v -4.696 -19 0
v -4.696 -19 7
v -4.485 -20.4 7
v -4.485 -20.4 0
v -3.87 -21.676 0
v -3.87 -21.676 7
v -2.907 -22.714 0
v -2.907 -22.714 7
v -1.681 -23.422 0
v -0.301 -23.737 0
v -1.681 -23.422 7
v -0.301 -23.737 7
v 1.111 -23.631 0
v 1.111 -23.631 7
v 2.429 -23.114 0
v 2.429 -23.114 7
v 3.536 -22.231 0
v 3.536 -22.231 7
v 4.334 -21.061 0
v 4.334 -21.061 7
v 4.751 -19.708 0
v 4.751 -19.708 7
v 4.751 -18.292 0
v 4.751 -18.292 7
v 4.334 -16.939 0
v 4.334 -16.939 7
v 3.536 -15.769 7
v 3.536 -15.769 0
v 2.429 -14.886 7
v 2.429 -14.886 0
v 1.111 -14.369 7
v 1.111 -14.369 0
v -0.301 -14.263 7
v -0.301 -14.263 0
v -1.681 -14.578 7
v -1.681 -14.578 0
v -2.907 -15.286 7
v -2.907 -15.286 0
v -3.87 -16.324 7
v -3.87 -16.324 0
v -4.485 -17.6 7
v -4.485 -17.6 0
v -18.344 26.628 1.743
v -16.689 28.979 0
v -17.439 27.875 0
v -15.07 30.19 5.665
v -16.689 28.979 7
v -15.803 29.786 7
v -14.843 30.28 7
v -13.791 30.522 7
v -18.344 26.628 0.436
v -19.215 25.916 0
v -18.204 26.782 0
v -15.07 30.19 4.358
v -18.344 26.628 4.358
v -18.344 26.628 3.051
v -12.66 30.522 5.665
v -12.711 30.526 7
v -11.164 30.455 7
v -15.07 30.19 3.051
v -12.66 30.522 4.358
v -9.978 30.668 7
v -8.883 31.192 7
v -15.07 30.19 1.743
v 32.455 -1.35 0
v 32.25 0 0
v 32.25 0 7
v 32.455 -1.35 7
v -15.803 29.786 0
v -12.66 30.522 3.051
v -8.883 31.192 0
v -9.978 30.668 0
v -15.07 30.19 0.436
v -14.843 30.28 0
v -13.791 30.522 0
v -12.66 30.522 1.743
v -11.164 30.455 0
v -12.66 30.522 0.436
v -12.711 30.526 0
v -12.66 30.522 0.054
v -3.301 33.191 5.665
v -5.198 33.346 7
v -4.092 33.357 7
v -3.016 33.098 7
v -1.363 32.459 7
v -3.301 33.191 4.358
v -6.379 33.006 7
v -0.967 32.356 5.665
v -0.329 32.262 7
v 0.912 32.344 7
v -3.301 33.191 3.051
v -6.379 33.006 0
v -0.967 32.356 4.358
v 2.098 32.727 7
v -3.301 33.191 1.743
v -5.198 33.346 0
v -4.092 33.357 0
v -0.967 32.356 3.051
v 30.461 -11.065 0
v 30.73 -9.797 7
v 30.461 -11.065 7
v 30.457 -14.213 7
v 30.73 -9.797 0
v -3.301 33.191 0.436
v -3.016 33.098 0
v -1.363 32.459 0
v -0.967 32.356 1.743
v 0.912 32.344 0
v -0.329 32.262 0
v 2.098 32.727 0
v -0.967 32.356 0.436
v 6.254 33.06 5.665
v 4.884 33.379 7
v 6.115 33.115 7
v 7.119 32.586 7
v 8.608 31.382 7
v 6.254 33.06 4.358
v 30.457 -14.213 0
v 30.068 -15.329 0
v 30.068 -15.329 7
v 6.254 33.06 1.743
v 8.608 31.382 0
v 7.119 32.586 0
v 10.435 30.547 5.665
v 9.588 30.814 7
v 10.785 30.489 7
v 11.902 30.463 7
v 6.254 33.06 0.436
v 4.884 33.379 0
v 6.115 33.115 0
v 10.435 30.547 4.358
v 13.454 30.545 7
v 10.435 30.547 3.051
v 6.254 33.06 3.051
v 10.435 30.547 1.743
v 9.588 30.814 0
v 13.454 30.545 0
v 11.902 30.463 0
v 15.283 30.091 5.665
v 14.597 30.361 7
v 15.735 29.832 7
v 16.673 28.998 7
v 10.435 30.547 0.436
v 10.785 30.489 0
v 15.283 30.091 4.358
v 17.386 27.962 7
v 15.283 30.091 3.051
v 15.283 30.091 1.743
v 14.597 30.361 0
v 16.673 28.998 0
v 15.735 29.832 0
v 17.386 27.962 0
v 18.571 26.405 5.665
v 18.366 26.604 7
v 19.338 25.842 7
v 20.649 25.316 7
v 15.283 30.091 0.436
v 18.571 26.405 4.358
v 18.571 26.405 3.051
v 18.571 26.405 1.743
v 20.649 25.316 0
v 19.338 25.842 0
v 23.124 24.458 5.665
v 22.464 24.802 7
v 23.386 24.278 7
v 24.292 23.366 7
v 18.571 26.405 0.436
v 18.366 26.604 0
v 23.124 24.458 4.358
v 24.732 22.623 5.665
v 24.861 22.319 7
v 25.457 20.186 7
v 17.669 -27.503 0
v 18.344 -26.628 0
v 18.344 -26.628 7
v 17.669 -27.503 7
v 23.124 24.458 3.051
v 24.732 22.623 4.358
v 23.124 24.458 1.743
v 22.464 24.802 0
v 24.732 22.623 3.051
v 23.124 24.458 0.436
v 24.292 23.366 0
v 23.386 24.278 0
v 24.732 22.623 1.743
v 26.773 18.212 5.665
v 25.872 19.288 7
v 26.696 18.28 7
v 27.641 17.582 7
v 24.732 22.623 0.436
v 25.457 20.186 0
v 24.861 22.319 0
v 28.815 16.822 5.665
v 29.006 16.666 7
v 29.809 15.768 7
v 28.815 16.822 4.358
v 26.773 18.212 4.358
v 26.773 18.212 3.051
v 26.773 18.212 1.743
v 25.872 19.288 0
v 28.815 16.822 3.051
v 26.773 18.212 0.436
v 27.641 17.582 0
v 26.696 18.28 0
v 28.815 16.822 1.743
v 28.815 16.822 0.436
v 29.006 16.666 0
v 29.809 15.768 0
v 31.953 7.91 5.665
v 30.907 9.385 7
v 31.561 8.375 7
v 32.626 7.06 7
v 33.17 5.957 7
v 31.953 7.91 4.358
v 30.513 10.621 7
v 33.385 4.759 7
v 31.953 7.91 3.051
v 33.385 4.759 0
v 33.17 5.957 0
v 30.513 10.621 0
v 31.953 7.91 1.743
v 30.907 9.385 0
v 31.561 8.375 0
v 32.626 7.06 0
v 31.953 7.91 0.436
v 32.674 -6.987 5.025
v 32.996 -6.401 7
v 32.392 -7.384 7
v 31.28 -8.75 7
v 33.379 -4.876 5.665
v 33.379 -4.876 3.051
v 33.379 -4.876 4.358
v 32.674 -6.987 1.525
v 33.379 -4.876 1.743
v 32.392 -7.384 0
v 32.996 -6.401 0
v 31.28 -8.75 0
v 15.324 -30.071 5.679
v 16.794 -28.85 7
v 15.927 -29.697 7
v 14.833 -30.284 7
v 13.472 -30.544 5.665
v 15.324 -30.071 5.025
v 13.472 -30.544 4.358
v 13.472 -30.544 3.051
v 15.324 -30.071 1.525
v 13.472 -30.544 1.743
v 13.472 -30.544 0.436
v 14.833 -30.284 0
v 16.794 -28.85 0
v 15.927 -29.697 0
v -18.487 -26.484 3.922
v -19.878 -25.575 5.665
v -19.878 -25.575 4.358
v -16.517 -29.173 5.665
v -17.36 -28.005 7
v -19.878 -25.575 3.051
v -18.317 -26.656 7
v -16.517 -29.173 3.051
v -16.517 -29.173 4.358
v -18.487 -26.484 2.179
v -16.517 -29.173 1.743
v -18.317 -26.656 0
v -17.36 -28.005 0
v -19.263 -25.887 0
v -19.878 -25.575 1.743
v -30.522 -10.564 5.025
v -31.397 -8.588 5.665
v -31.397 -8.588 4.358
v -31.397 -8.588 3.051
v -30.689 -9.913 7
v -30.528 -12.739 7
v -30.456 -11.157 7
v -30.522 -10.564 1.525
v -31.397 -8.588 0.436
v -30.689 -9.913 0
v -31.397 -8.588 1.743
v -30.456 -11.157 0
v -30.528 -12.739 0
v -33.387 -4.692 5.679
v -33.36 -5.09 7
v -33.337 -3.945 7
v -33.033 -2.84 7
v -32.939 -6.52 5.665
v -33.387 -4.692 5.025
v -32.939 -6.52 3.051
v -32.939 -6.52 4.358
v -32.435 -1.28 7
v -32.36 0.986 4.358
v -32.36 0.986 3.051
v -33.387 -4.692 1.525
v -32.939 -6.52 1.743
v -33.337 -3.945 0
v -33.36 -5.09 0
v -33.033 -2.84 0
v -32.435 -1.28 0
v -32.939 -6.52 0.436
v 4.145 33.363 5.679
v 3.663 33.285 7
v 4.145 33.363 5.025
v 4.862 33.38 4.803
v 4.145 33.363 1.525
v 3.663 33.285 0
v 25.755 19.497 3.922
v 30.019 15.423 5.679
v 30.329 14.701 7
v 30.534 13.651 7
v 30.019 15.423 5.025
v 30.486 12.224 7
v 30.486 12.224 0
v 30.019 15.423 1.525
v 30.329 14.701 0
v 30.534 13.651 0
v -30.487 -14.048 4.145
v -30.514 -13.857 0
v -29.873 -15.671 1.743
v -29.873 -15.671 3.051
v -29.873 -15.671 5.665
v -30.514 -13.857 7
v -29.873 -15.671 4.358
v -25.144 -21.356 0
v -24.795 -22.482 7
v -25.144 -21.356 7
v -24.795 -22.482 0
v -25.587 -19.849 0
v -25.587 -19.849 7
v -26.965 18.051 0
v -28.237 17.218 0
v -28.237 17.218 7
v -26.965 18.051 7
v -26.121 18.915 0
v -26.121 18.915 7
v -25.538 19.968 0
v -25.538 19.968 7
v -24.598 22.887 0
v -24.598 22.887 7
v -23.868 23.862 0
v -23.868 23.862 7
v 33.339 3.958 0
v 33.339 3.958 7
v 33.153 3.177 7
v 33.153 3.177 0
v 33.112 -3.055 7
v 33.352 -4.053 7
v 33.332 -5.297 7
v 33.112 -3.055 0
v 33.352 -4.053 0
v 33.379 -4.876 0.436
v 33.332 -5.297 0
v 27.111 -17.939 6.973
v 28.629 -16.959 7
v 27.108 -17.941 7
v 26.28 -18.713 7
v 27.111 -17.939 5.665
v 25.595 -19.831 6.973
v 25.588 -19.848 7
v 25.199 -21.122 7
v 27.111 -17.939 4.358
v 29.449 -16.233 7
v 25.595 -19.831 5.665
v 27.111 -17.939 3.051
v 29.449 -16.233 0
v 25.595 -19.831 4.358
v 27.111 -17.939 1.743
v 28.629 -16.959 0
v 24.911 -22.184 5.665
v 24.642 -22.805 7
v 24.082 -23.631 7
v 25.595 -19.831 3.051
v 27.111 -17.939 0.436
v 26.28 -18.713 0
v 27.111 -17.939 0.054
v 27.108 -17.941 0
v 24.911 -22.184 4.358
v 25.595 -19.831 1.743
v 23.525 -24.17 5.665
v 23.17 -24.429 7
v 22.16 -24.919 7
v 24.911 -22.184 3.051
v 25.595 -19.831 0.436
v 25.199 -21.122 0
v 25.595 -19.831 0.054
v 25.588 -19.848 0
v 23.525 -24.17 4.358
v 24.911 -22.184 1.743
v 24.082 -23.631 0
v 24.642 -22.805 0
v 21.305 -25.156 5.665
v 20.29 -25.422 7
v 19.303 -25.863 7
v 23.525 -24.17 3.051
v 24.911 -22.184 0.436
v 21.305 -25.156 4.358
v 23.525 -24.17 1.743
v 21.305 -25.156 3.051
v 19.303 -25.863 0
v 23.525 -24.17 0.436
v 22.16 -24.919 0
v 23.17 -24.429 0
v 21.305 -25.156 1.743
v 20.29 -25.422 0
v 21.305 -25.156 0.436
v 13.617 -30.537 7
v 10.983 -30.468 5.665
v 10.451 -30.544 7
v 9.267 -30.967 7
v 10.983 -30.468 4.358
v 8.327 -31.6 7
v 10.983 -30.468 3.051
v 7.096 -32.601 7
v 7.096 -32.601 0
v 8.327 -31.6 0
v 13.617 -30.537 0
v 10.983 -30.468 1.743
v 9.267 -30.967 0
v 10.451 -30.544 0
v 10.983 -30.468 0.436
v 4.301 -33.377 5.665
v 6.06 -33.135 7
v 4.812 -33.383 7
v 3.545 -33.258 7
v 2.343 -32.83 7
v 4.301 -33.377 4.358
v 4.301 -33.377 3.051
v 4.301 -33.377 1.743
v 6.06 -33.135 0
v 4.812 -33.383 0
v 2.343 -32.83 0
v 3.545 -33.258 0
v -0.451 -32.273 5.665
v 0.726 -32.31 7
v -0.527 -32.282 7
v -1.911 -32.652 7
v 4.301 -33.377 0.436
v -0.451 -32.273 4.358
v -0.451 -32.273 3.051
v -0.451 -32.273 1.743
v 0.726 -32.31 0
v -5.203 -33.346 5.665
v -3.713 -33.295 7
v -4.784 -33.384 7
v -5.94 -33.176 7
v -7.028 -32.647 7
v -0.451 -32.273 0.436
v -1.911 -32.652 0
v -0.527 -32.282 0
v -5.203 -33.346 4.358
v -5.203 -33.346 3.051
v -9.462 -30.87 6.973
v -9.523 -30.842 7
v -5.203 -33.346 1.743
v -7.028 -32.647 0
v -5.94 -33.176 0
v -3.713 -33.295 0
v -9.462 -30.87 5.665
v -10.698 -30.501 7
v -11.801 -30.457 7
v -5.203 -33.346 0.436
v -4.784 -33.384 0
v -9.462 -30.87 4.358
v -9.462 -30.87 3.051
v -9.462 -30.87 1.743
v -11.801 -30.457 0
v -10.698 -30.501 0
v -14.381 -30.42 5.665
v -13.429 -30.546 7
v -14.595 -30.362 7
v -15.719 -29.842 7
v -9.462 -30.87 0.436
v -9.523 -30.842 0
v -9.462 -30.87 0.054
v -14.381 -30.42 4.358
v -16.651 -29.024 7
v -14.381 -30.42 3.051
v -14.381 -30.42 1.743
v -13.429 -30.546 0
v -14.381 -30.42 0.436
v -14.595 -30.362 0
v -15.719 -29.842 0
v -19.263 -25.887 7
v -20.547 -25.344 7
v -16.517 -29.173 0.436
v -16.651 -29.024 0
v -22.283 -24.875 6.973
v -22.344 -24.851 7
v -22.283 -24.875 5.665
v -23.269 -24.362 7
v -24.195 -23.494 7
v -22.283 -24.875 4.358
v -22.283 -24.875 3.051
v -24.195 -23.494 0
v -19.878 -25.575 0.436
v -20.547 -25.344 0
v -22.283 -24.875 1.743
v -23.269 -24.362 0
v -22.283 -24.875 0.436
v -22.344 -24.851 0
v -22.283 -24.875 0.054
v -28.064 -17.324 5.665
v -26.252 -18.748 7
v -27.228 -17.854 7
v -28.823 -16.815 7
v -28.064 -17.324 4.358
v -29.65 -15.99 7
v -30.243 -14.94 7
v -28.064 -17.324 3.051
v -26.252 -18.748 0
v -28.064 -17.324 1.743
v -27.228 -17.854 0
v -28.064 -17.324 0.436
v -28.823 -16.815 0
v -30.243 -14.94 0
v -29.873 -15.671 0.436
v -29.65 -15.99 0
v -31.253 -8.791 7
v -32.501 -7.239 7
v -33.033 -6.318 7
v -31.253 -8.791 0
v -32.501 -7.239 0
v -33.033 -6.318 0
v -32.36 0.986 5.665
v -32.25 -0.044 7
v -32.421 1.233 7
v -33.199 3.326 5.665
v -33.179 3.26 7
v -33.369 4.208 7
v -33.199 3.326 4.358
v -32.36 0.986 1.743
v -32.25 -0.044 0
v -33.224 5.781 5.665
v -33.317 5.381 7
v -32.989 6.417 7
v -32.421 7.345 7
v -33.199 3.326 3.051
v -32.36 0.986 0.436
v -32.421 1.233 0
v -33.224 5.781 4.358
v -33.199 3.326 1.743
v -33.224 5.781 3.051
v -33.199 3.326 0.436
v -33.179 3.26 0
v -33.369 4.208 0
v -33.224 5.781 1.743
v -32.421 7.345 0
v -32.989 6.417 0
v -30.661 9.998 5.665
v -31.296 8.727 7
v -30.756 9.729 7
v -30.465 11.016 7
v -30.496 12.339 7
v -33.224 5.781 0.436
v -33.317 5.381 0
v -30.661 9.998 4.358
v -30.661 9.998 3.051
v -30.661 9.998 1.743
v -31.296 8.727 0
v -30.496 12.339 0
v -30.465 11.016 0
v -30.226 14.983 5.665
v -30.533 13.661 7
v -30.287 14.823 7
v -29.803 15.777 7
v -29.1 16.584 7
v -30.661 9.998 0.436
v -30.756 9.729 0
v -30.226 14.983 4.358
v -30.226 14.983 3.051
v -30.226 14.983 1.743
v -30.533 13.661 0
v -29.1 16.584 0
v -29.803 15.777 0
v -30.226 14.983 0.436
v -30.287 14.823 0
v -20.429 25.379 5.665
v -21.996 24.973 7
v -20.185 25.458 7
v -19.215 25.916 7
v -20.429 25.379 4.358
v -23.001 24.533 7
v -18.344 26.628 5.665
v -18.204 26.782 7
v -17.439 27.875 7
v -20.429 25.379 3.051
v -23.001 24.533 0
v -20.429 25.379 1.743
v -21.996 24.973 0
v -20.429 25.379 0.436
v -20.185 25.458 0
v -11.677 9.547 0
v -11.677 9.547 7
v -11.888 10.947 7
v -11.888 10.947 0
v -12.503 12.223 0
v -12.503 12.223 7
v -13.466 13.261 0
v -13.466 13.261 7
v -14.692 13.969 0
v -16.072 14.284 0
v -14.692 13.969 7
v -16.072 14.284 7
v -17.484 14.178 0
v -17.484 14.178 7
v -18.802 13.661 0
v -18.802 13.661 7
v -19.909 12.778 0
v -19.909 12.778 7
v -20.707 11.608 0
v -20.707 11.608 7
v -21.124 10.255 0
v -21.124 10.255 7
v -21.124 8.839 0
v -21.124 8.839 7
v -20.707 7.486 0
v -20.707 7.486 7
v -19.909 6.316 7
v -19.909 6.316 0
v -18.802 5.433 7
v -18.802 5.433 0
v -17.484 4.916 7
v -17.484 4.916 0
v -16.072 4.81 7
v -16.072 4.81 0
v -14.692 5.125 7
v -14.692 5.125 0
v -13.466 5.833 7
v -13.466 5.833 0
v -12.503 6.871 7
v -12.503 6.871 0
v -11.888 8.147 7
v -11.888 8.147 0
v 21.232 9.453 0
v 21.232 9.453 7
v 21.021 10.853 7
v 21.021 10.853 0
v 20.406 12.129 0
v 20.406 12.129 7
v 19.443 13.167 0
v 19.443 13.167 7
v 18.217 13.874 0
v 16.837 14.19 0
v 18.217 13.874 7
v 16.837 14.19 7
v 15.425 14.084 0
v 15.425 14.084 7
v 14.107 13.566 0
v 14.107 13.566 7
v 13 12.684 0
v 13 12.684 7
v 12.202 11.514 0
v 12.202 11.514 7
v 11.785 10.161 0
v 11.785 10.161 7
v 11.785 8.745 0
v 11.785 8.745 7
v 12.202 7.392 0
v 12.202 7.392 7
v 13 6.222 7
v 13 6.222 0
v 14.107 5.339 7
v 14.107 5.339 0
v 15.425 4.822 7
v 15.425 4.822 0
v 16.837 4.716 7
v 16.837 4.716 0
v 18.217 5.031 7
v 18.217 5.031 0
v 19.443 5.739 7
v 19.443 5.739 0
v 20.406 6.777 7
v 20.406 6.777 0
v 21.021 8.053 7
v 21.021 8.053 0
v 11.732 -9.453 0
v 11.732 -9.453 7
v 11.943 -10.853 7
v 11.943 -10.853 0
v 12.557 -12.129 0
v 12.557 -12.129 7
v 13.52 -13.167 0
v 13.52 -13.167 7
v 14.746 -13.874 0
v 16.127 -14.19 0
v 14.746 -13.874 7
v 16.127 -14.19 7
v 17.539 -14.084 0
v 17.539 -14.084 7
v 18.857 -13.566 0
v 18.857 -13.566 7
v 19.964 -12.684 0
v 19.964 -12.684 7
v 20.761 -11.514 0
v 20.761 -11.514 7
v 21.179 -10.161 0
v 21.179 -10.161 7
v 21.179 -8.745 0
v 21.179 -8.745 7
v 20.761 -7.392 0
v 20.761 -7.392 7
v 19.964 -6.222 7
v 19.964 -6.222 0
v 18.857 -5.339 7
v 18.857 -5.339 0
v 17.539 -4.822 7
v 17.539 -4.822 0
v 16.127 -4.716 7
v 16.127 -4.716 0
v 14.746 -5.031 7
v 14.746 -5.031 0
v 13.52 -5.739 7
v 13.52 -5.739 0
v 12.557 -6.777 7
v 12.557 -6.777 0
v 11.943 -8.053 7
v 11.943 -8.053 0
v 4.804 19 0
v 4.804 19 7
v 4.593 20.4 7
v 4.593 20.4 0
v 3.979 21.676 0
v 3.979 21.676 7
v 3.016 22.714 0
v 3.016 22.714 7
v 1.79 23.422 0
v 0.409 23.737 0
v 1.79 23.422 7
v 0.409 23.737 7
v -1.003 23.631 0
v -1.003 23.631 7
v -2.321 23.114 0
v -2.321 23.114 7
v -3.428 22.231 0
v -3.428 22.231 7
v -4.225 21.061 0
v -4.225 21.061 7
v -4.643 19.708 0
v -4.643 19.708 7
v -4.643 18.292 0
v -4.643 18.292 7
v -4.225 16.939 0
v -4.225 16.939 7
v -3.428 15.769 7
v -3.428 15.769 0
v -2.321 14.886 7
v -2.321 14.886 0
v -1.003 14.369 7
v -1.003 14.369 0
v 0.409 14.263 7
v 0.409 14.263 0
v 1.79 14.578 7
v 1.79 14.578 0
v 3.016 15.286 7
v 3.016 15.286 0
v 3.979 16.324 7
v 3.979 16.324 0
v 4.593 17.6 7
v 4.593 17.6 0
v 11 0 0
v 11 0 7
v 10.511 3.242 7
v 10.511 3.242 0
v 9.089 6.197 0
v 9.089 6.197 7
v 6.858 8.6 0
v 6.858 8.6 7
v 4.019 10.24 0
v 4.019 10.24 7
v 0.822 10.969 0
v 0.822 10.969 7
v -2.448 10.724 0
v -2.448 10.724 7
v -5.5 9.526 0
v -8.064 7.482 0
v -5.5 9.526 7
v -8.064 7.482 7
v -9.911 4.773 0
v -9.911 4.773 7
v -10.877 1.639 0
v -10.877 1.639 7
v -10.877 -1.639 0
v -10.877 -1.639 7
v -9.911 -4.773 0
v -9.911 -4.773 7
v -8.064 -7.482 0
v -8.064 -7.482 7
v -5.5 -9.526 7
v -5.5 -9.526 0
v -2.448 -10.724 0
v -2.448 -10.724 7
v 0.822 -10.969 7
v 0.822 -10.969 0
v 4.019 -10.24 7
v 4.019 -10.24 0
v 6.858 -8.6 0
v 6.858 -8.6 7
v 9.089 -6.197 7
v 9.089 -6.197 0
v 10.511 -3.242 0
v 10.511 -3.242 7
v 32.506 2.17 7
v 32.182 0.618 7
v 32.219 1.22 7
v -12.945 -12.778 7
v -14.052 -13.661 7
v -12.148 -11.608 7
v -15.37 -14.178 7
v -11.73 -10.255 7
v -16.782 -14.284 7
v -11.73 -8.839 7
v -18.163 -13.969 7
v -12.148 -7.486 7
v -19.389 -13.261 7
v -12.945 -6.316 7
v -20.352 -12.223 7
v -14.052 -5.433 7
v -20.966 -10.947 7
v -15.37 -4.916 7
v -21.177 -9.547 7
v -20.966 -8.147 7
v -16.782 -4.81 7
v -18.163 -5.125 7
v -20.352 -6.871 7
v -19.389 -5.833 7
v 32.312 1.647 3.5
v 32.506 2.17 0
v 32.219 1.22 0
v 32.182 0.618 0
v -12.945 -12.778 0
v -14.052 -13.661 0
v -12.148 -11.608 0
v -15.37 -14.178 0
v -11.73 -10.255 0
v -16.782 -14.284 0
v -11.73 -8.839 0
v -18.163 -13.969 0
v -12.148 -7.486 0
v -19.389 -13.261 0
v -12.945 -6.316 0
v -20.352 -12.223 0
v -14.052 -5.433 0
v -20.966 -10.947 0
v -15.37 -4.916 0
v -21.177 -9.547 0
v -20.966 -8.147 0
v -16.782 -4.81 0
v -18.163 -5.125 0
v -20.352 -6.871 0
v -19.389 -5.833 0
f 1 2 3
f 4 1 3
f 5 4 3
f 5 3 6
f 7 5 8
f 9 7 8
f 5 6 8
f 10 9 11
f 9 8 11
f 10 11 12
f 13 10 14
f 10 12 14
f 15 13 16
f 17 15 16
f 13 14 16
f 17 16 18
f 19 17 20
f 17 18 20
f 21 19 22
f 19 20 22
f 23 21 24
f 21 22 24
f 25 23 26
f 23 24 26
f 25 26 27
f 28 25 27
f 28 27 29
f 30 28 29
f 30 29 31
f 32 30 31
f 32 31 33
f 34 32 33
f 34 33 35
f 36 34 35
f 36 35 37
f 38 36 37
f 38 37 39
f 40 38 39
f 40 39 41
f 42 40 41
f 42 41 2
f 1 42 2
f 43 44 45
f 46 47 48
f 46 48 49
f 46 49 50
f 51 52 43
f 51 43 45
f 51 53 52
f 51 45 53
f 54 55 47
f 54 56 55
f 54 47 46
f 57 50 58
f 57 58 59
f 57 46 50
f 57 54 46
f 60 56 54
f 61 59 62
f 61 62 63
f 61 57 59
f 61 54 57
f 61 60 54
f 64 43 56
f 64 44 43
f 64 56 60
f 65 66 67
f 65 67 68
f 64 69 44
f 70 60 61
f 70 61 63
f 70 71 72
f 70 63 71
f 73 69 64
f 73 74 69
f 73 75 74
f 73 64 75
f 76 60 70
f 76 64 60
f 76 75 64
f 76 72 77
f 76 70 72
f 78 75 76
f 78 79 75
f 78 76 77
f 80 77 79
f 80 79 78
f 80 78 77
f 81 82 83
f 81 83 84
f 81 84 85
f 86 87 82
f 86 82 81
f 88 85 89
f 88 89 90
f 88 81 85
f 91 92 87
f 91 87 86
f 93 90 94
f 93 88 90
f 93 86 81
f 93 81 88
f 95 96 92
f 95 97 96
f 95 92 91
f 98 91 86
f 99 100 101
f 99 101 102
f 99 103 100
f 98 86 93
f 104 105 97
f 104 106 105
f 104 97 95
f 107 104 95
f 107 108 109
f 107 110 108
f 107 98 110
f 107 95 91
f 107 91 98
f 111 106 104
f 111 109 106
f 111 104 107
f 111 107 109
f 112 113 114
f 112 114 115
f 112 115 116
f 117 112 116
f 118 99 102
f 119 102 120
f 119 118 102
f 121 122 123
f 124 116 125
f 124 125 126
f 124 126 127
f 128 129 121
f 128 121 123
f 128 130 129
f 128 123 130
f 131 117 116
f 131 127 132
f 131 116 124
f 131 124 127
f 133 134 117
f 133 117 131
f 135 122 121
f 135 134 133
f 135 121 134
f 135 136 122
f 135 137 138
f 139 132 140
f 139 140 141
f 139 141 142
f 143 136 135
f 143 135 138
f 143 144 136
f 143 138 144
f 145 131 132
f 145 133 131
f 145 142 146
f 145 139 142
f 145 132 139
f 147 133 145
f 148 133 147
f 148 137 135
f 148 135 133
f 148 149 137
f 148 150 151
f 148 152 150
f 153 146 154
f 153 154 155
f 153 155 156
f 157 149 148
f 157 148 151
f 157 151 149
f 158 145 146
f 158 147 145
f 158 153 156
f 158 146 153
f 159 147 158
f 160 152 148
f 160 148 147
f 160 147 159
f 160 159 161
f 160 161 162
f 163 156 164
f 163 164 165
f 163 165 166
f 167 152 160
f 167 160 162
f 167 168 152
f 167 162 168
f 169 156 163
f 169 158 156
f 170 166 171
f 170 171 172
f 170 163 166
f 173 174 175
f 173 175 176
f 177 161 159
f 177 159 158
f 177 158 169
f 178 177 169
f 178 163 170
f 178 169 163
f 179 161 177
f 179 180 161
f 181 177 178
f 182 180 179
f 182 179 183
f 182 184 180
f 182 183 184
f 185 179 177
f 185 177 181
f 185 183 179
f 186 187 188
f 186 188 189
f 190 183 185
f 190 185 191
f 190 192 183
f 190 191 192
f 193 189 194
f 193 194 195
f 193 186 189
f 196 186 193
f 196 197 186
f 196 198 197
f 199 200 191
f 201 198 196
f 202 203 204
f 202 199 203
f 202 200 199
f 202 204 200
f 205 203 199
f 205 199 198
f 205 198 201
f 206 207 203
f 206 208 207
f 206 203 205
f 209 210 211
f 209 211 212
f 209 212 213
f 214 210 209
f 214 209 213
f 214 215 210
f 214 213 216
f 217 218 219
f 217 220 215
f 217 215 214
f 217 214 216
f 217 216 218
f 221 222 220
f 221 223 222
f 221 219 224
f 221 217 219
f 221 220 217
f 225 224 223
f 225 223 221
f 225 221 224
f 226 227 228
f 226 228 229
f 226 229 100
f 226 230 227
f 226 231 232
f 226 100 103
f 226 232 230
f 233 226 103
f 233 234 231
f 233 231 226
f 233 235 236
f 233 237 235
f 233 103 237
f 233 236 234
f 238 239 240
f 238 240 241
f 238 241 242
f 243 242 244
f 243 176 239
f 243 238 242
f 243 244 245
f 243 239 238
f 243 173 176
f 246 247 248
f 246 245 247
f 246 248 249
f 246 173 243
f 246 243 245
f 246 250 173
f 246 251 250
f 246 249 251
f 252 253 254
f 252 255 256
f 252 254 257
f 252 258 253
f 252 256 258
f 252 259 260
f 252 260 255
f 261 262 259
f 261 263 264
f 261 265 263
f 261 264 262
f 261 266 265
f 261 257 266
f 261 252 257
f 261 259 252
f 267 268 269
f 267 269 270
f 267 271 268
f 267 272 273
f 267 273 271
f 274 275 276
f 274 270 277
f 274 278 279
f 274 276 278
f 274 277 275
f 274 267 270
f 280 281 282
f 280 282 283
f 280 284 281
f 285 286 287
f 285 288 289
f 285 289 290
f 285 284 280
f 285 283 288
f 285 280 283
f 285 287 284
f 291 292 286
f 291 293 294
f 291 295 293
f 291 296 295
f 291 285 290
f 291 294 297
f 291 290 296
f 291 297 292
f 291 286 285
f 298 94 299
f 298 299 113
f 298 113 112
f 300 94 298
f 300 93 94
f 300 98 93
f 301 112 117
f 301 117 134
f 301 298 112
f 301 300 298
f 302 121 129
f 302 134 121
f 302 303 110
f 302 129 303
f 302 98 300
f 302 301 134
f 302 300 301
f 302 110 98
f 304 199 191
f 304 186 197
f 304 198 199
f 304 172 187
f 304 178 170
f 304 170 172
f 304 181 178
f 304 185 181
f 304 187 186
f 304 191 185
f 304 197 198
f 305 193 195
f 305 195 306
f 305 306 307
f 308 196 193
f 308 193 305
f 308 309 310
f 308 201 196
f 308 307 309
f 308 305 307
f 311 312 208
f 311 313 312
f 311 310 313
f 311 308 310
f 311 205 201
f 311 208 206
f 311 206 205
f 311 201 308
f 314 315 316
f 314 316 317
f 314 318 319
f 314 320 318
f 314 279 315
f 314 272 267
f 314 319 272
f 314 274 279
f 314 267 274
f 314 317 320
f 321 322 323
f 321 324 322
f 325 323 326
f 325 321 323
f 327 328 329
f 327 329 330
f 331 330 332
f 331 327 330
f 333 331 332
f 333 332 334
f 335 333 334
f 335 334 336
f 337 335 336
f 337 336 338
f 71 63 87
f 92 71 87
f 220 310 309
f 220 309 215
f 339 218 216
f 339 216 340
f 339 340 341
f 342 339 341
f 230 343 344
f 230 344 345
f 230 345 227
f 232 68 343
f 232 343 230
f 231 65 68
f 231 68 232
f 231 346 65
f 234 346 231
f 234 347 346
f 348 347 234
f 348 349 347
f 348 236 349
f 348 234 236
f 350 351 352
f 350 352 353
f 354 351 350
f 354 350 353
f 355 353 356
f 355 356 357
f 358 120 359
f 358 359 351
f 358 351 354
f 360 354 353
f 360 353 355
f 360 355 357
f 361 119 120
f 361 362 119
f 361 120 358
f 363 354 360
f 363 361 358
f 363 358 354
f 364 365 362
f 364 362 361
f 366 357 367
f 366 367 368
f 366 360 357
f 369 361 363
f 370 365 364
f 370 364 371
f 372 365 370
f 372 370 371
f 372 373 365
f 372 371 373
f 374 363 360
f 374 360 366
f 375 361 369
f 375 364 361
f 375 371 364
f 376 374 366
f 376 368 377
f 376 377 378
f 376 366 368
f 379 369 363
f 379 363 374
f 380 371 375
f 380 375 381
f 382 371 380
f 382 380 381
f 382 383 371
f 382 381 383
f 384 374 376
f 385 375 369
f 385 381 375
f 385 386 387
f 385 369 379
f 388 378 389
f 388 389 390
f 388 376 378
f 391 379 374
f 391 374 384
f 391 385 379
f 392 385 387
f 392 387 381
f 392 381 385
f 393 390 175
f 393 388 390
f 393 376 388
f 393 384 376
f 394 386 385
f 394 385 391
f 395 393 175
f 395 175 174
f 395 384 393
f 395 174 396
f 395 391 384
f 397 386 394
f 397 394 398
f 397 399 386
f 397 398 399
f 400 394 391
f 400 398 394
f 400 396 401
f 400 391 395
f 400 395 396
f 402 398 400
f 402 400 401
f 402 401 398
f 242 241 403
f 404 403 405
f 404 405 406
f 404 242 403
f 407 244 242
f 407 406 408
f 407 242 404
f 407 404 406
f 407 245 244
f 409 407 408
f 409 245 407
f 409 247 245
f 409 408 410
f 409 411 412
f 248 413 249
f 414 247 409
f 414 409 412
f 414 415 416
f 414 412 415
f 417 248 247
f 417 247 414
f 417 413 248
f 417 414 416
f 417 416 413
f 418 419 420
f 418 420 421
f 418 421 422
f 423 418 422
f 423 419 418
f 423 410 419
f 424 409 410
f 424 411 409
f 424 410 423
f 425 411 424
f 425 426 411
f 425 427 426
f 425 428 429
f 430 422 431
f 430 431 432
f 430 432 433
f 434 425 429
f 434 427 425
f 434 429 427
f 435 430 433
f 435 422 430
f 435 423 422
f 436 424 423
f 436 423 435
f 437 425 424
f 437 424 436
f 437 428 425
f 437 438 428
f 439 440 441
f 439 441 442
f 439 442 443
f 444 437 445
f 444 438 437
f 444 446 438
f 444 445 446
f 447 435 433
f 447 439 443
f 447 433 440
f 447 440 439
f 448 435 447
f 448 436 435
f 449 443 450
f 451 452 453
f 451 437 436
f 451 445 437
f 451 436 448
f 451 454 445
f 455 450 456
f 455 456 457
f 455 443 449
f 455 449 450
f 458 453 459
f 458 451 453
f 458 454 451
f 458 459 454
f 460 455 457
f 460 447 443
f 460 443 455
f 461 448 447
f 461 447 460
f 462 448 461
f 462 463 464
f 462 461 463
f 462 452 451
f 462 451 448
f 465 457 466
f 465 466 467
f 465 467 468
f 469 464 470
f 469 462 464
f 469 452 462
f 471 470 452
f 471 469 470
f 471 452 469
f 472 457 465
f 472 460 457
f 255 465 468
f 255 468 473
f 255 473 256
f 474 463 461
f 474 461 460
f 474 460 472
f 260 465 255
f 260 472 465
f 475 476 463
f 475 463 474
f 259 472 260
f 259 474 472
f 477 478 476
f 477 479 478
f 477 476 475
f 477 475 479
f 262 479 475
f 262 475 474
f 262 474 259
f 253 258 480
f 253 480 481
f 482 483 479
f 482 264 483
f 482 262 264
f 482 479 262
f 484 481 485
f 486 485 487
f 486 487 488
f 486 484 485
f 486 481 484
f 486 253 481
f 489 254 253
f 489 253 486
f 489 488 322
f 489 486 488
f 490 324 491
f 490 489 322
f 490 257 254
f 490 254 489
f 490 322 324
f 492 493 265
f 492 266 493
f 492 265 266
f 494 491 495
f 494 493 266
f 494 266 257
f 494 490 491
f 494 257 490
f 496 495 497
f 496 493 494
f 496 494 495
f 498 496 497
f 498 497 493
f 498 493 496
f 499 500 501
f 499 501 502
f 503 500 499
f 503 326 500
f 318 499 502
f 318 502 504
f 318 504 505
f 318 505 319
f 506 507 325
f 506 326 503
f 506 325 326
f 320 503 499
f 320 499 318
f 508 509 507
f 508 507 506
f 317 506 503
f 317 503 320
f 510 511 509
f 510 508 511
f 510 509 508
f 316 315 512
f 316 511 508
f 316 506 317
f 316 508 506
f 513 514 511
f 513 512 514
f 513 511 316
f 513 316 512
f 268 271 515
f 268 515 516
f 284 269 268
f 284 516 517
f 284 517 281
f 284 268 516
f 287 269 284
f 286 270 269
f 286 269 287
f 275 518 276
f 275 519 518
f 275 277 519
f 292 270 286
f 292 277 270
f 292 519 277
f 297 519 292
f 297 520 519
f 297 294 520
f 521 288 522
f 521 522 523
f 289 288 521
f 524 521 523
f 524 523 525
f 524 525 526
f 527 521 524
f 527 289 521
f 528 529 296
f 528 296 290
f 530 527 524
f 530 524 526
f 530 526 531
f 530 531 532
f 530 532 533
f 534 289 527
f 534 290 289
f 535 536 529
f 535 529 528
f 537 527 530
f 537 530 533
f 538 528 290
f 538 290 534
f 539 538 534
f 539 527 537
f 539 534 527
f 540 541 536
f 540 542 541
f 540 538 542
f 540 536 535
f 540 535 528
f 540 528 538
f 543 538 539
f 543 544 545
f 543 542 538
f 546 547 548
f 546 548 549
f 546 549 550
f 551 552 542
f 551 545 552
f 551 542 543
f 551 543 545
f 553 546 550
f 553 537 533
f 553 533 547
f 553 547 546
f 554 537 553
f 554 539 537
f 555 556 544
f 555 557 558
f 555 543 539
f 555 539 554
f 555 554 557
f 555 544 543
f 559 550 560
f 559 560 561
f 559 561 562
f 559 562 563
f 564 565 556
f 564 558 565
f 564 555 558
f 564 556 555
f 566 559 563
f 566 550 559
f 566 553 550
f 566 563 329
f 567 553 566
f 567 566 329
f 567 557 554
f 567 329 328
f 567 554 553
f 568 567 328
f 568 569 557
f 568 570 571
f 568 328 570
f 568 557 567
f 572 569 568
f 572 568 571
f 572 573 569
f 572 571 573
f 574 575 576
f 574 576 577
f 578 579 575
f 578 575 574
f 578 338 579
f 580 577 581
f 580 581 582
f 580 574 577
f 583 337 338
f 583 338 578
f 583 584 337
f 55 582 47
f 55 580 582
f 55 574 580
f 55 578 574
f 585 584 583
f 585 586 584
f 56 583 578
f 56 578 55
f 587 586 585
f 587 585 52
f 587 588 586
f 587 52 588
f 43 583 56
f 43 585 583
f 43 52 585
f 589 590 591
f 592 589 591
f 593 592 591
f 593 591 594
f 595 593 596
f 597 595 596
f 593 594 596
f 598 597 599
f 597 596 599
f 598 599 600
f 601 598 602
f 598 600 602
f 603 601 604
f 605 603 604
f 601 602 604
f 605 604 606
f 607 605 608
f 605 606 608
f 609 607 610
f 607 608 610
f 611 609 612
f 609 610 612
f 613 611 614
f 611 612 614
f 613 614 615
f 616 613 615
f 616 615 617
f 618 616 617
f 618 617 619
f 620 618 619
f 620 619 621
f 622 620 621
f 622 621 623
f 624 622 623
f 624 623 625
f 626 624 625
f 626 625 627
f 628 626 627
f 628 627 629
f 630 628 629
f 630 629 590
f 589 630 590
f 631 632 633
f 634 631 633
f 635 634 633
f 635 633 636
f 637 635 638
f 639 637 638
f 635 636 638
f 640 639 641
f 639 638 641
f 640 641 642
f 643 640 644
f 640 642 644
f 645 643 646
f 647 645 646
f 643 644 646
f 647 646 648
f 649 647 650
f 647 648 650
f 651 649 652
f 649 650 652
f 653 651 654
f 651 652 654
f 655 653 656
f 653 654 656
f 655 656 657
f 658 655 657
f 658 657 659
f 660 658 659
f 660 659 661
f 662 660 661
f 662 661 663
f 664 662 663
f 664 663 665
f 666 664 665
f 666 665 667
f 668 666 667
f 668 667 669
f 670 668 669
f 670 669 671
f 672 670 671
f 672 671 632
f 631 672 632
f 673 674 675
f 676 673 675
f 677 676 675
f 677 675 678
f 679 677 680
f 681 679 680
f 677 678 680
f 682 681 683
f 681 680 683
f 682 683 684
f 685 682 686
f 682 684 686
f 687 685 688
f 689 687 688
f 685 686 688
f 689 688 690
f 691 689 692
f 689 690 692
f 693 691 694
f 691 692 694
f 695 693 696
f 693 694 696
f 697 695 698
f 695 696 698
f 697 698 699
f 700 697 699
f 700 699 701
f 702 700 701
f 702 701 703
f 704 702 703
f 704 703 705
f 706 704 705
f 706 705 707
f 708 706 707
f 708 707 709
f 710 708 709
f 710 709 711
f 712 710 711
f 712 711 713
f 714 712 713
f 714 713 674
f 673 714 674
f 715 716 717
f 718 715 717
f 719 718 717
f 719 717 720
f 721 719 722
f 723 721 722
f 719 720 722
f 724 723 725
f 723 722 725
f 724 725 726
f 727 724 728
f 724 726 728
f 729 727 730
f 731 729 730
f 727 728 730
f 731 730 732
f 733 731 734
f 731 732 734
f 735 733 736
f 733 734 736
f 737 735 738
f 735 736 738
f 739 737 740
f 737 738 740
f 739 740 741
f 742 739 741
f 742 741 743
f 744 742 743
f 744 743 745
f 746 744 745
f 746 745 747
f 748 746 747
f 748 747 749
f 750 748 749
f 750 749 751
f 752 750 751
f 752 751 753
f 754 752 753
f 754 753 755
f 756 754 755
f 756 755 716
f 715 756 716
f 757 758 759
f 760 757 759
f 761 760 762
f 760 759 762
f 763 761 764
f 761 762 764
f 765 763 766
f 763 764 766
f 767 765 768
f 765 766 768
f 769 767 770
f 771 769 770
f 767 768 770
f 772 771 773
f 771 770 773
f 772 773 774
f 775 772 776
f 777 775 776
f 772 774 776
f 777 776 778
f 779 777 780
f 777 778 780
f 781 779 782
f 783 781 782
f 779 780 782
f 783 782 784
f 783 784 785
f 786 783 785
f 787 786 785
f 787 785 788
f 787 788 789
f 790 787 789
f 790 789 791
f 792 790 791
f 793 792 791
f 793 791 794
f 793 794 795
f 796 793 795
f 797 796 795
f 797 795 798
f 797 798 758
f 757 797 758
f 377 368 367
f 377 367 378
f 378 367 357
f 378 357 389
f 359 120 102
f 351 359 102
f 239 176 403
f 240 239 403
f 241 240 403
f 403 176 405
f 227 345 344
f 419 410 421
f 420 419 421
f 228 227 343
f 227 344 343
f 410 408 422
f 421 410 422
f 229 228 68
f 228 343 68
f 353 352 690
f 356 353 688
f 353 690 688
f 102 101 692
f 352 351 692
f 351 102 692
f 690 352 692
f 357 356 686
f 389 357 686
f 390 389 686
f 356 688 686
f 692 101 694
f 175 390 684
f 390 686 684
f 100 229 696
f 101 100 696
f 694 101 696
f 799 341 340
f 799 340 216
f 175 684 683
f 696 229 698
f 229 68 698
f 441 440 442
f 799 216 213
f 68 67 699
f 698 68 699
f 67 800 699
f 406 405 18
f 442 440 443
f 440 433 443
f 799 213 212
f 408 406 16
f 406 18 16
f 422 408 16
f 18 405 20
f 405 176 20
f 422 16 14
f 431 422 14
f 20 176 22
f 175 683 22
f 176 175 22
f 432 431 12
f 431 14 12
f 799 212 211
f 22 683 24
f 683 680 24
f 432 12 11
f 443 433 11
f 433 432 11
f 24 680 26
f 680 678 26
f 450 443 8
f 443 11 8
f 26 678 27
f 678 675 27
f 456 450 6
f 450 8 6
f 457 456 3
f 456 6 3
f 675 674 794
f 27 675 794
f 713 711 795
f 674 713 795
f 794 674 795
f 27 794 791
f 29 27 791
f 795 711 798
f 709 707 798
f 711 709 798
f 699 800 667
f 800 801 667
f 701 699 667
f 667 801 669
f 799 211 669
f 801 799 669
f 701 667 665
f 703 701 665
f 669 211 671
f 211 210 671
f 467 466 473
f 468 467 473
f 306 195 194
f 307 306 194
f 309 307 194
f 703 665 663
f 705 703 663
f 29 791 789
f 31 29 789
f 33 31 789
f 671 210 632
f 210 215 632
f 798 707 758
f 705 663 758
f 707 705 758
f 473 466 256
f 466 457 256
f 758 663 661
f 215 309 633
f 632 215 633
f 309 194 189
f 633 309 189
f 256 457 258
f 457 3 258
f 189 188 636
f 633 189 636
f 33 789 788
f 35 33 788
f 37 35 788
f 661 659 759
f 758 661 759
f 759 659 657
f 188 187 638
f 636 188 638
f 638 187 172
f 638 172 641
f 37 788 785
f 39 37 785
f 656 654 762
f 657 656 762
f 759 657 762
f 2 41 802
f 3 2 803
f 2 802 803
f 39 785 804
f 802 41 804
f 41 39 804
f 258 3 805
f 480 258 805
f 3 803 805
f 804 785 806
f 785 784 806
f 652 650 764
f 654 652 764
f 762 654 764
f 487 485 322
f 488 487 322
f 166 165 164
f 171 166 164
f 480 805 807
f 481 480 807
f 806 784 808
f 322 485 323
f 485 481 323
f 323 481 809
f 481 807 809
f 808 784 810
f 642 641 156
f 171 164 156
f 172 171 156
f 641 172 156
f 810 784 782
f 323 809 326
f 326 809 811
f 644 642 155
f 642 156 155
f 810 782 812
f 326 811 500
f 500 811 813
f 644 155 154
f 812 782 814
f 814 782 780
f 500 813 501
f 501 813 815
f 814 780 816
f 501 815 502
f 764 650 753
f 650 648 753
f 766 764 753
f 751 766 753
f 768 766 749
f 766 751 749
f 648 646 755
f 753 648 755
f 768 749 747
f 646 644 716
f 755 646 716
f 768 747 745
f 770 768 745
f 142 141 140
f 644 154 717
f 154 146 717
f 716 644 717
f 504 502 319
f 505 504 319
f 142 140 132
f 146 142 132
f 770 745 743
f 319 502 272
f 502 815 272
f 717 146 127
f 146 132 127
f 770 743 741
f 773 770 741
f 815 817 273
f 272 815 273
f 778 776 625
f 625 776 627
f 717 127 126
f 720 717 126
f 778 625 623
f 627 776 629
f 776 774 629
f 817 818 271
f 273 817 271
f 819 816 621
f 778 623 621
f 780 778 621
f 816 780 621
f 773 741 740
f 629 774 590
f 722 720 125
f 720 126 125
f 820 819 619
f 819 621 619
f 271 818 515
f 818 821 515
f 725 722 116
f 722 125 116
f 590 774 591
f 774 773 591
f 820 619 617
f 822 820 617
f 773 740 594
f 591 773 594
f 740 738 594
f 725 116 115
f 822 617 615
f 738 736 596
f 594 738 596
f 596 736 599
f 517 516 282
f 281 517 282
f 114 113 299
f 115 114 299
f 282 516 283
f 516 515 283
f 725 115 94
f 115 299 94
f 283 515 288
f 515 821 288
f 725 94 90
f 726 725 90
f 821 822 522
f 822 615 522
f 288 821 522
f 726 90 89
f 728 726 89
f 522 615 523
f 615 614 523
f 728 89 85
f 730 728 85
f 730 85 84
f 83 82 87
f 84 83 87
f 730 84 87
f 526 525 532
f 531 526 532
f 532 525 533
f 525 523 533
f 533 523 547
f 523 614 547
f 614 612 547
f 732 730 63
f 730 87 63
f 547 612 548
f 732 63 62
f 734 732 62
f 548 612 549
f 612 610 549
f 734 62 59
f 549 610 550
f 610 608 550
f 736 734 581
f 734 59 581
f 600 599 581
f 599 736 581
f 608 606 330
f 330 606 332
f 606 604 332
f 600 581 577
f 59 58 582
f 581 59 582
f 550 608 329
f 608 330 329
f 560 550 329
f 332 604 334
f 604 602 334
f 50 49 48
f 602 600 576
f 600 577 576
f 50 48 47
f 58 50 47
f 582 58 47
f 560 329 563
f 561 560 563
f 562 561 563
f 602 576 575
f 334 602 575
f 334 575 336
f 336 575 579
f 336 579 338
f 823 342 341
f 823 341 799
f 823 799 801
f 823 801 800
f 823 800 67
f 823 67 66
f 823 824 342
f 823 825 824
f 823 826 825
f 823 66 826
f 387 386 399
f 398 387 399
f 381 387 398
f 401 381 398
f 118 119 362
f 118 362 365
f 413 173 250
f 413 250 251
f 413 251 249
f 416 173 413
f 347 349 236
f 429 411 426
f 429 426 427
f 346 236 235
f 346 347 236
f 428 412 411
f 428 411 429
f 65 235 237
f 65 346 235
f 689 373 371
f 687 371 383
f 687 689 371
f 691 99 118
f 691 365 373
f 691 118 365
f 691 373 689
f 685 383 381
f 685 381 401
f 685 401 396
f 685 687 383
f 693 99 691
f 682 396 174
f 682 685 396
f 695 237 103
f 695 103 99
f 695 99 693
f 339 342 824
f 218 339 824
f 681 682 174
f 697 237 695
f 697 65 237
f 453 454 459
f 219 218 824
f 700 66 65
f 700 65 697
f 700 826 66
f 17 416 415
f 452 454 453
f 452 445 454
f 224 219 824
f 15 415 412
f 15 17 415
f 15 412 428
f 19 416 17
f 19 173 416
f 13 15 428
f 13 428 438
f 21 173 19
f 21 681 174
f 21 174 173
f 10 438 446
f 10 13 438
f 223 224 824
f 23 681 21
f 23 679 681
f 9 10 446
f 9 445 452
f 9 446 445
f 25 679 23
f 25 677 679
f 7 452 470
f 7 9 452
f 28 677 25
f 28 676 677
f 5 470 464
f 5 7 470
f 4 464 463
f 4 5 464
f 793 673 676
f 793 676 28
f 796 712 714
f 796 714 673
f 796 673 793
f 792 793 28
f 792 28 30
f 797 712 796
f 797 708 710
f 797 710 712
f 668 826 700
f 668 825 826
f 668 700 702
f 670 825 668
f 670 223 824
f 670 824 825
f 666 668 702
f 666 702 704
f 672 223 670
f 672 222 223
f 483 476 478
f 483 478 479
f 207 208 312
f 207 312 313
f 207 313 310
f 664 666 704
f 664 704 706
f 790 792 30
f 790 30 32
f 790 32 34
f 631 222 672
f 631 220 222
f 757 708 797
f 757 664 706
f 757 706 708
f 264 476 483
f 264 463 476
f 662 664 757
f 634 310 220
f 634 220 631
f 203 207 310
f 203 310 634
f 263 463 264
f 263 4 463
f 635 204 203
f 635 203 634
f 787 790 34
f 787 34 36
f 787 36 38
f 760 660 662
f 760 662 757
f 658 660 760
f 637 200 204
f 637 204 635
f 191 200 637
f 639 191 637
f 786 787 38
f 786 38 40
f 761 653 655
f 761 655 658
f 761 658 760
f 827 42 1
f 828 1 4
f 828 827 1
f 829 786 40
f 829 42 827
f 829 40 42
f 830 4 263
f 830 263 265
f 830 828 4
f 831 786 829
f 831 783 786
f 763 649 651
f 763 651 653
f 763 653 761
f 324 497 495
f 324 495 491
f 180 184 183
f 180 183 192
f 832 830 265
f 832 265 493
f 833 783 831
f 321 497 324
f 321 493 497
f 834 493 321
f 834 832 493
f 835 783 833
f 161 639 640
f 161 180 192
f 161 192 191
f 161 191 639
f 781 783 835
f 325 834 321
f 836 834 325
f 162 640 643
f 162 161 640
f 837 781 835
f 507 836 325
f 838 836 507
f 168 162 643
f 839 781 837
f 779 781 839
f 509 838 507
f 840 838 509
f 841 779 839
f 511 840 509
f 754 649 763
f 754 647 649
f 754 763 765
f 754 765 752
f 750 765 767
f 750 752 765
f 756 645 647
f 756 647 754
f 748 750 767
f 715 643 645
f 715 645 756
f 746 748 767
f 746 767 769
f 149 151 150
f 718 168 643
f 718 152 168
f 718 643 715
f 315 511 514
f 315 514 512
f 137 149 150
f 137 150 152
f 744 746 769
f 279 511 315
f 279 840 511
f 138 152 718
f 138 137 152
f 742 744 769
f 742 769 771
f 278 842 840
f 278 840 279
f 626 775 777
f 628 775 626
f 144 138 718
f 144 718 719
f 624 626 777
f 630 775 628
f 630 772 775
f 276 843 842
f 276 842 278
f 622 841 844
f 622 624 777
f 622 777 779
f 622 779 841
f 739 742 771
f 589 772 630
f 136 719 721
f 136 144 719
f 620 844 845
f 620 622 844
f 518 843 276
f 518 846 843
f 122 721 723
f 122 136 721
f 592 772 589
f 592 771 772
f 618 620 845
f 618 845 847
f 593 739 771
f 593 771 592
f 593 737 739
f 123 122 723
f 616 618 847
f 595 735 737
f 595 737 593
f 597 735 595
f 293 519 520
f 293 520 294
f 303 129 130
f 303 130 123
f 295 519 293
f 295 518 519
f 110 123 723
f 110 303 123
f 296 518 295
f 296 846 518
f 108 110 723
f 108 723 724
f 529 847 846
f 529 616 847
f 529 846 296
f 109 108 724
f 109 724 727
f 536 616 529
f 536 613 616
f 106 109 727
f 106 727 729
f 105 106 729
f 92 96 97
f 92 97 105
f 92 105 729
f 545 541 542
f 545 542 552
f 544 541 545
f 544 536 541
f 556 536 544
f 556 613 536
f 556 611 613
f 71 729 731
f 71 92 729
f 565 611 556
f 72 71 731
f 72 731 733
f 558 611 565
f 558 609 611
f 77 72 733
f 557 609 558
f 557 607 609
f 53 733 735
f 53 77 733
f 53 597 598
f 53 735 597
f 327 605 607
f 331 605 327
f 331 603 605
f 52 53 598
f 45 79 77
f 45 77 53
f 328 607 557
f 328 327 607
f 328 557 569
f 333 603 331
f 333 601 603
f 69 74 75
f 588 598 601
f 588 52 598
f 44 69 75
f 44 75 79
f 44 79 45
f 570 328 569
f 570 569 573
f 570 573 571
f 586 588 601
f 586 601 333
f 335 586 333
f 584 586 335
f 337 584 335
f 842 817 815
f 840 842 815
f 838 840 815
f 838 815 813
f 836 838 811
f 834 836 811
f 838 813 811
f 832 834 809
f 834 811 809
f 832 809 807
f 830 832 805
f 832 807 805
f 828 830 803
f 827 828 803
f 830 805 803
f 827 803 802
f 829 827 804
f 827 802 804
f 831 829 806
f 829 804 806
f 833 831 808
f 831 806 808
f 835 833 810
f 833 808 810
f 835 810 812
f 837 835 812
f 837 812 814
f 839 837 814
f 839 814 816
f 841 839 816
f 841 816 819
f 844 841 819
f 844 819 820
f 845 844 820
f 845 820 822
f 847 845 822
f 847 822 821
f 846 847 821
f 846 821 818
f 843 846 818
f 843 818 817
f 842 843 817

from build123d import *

# Parameters (mm, degrees)
BOSS_EXTRUDE1_DEPTH = 7
SKETCH2_R           = 11
SKETCH2_R_2         = 4.75
SKETCH2_R_3         = 4.749999995
SKETCH2_R_4         = 4.750000007
SKETCH2_R_5         = 4.750000003
CUT_EXTRUDE3_DEPTH  = 48.733141781


with BuildPart() as part:
    # Sketch1 → Boss-Extrude1 (new body)
    with BuildSketch(Plane.XY):
        with BuildLine():
            add(Edge.make_bspline(
                [(32.25, 1e-09), (32.25, -0.03584026), (32.251080395, -0.107557917), (32.255942168, -0.244822693), (32.268861596, -0.42423358), (32.288126492, -0.590307491), (32.313597344, -0.75526022), (32.345083769, -0.921284338), (32.382340363, -1.086200834), (32.435743217, -1.290221504), (32.510017409, -1.532192074), (32.609572454, -1.810337489), (32.736031435, -2.123211782), (32.868409264, -2.433561535), (32.998463612, -2.744978513), (33.147670028, -3.139574299), (33.29203351, -3.625611027), (33.391238098, -4.209938144), (33.40159236, -4.963887179), (33.263092101, -5.783976593), (32.933637021, -6.632976673), (32.380720256, -7.44914111), (31.743633074, -8.128548572), (31.194565339, -8.824864423), (30.792041933, -9.563839804), (30.542619062, -10.317563139), (30.426059081, -11.150959974), (30.453700427, -12.037430256), (30.571486472, -12.961397721), (30.548973562, -13.946062453), (30.305827306, -14.908972914), (29.8488621, -15.794930036), (29.197566297, -16.55957303), (28.387565065, -17.156146763), (27.550974388, -17.611279668), (26.8094699, -18.137433767), (26.205567855, -18.754025976), (25.754198906, -19.433148369), (25.419097837, -20.210957063), (25.205654831, -21.059332432), (25.023165763, -21.946222304), (24.678918541, -22.824303369), (24.155385031, -23.610913554), (23.47258695, -24.266165938), (22.663154471, -24.7596191), (21.767380441, -25.068988477), (20.873877723, -25.241670484), (20.026176208, -25.483558737), (19.257961529, -25.852796939), (18.597014435, -26.339289543), (18.015319336, -26.96235034), (17.530200194, -27.697909274), (17.088002691, -28.493747234), (16.507844893, -29.243486782), (15.772859754, -29.859313296), (14.912564693, -30.302576631), (13.965315475, -30.54635699), (12.98025215, -30.573037387), (12.056322353, -30.455886167), (11.169960105, -30.425170838), (10.336137669, -30.538425829), (9.581252254, -30.784420953), (8.840709776, -31.184040969), (8.142429819, -31.730755162), (7.463613048, -32.368451781), (6.650013052, -32.924567132), (5.739798426, -33.282624756), (4.783005447, -33.428033479), (3.826528798, -33.360257301), (2.916983602, -33.093242599), (2.091628303, -32.709045741), (1.26637753, -32.40011834), (0.429302587, -32.239240586), (-0.391382596, -32.235565239), (-1.22968536, -32.389684614), (-2.0572378, -32.693302158), (-2.881721983, -33.078601543), (-3.788770237, -33.353385358), (-4.733774423, -33.42838768), (-5.671092486, -33.298000902), (-6.556445254, -32.967881994), (-7.350178183, -32.458558488), (-8.018687609, -31.847917072), (-8.690679722, -31.287739131), (-9.419625653, -30.856516656), (-10.184465575, -30.573711459), (-11.03571026, -30.431180216), (-11.944792517, -30.442626541), (-12.889163565, -30.566141215), (-13.895181285, -30.557956001), (-14.87113339, -30.320567678), (-15.760797756, -29.870869827), (-16.522447913, -29.233522337), (-17.118094619, -28.449212827), (-17.565712962, -27.632421294), (-18.065390764, -26.899614077), (-18.650481966, -26.294814018), (-19.296064795, -25.832745125), (-20.056657392, -25.472681848), (-20.910331773, -25.233134263), (-21.825203321, -25.057736755), (-22.751582791, -24.720739593), (-23.573115298, -24.189933119), (-24.248840304, -23.497093196), (-24.751359701, -22.680439304), (-25.064603709, -21.786008149), (-25.237894516, -20.892406484), (-25.476928432, -20.044090314), (-25.843074795, -19.274341716), (-26.326600825, -18.611224875), (-26.947330385, -18.027030012), (-27.681412221, -17.539453985), (-28.477538309, -17.097997439), (-29.229618148, -16.521157931), (-29.848604233, -15.788832927), (-30.295754573, -14.930542362), (-30.543605502, -13.984363508), (-30.57456144, -12.999231857), (-30.458084156, -12.075098728), (-30.424367357, -11.188988864), (-30.534311318, -10.354690195), (-30.776875242, -9.598734005), (-31.173567909, -8.856576796), (-31.717880897, -8.156414765), (-32.356136698, -7.477963354), (-32.915398504, -6.667140338), (-33.283154456, -5.744604994), (-33.432509226, -4.758990118), (-33.353397152, -3.75766975), (-33.047197129, -2.799491173), (-32.637917259, -1.939569952), (-32.348479254, -1.077600722), (-32.223693767, -0.223626791), (-32.259097298, 0.591019042), (-32.446410543, 1.416966955), (-32.773243466, 2.228342112), (-33.146425069, 3.05346988), (-33.382488072, 3.966548555), (-33.420035871, 4.916249167), (-33.247541542, 5.857668601), (-32.870746257, 6.745815511), (-32.306284436, 7.533437088), (-31.679184935, 8.200013939), (-31.151082078, 8.893226913), (-30.767724626, 9.62347225), (-30.533327538, 10.364780464), (-30.425852641, 11.182587503), (-30.456115217, 12.053028073), (-30.57044759, 12.961496123), (-30.549533517, 13.930765879), (-30.315621222, 14.877939042), (-29.87541213, 15.751878255), (-29.247523253, 16.509050406), (-28.46544523, 17.108273666), (-27.648960196, 17.55636261), (-26.914470828, 18.053478276), (-26.307340893, 18.636141864), (-25.842338245, 19.279662272), (-25.479266059, 20.038804033), (-25.236815929, 20.891806711), (-25.062198676, 21.806705948), (-24.729295697, 22.734354454), (-24.20202431, 23.558169194), (-23.512255201, 24.237008277), (-22.697777389, 24.74303772), (-21.804533826, 25.060153895), (-20.910965853, 25.234161069), (-20.061987548, 25.470376036), (-19.290772545, 25.833422728), (-18.625484989, 26.313982965), (-18.0388195, 26.93231861), (-17.548735535, 27.664959335), (-17.10796282, 28.461209915), (-16.534392163, 29.215784218), (-15.812944863, 29.830728484), (-14.977234069, 30.274744494), (-14.066517637, 30.526562287), (-13.124972172, 30.579491021), (-12.225320095, 30.477855894), (-11.352300693, 30.420611213), (-10.509198984, 30.5014714), (-9.724582773, 30.723575454), (-8.952700657, 31.109863531), (-8.224799511, 31.654406363), (-7.53328827, 32.309492131), (-6.713650395, 32.892779932), (-5.778866527, 33.275025561), (-4.783689107, 33.432306412), (-3.776579779, 33.356996625), (-2.817028253, 33.054939744), (-1.956947609, 32.645597809), (-1.096221684, 32.353093368), (-0.24268098, 32.224753798), (0.572143478, 32.256517558), (1.398855976, 32.440618518), (2.211303462, 32.765181102), (3.035622993, 33.139660067), (3.947616622, 33.379700709), (4.891604445, 33.421034296), (5.823512573, 33.256381407), (6.69945148, 32.893917966), (7.477767129, 32.353045748), (8.142948467, 31.731914513), (8.835724848, 31.186903416), (9.584991508, 30.780564963), (10.366383266, 30.529626848), (11.212102964, 30.423164574), (12.092486758, 30.461281464), (12.99612118, 30.571807634), (13.943649273, 30.545643795), (14.874489725, 30.315479217), (15.739983569, 29.882441225), (16.495629409, 29.261403498), (17.098384886, 28.481668508), (17.547072979, 27.665471693), (18.041630009, 26.929367925), (18.621868133, 26.319917893), (19.263294063, 25.852011417), (20.020958736, 25.485922122), (20.873264512, 25.240541889), (21.788177848, 25.066597447), (22.717076691, 24.737783832), (23.543166874, 24.214052248), (24.225109953, 23.527364126), (24.734646511, 22.715070024), (25.0556406, 21.823032223), (25.230470514, 20.929510983), (25.463891902, 20.079894914), (25.823854301, 19.307238044), (26.301409548, 18.639811686), (26.917359159, 18.050670837), (27.648460376, 17.558076142), (28.444909927, 17.117856696), (29.201785946, 16.547605137), (29.81984157, 15.82878727), (30.267636372, 14.995097053), (30.523375754, 14.085436493), (30.580435366, 13.144017152), (30.480213655, 12.243995051), (30.420588583, 11.371383627), (30.497965021, 10.527830776), (30.716858994, 9.742562755), (31.099373189, 8.968622161), (31.567480712, 8.340299437), (32.038361194, 7.819076523), (32.437316878, 7.337829001), (32.724515784, 6.927769227), (32.967242303, 6.489680677), (33.159093214, 6.026952619), (33.298790924, 5.536156351), (33.370144453, 5.089484367), (33.392607682, 4.695978095), (33.384025491, 4.360403743), (33.360509543, 4.092595223), (33.325535309, 3.859348386), (33.287278414, 3.665828734), (33.246547966, 3.497829168), (33.208210173, 3.357605542), (33.178892757, 3.259230135), (33.161701284, 3.204461577), (33.1529127, 3.177331049)],
                knots=[0.074412945, 0.074412945, 0.074412945, 0.074412945, 0.074412945, 0.075079832, 0.075746718, 0.076413605, 0.077080492, 0.077747379, 0.078414266, 0.079081153, 0.07974804, 0.081081814, 0.082415588, 0.083749362, 0.085083135, 0.086416909, 0.087750683, 0.090418231, 0.093085778, 0.095753326, 0.099621314, 0.103489302, 0.10735729, 0.111225278, 0.114346934, 0.117468589, 0.120590245, 0.123711901, 0.127579429, 0.131446956, 0.135314483, 0.13918201, 0.143133347, 0.147084683, 0.151036019, 0.154987355, 0.158192723, 0.16139809, 0.164603458, 0.167808826, 0.171509303, 0.175209781, 0.178910259, 0.182610737, 0.186332763, 0.19005479, 0.193776816, 0.197498843, 0.200724519, 0.203950195, 0.207175871, 0.210401547, 0.214124039, 0.21784653, 0.221569022, 0.225291513, 0.229159212, 0.23302691, 0.236894609, 0.240762307, 0.243884009, 0.24700571, 0.250127411, 0.253249113, 0.257116886, 0.260984658, 0.264852431, 0.268720204, 0.272442617, 0.276165031, 0.279887444, 0.283609858, 0.286835561, 0.290061263, 0.293286965, 0.296512668, 0.300234744, 0.303956821, 0.307678897, 0.311400974, 0.31510136, 0.318801747, 0.322502134, 0.32620252, 0.329407959, 0.332613398, 0.335818836, 0.339024275, 0.342975633, 0.346926991, 0.350878349, 0.354829708, 0.358697179, 0.36256465, 0.36643212, 0.370299591, 0.373421213, 0.376542834, 0.379664455, 0.382786076, 0.386654154, 0.390522232, 0.394390309, 0.398258387, 0.401980554, 0.405702722, 0.409424889, 0.413147056, 0.416372784, 0.419598511, 0.422824238, 0.426049965, 0.429772262, 0.433494558, 0.437216855, 0.440939151, 0.444807053, 0.448674955, 0.452542858, 0.45641076, 0.459532441, 0.462654122, 0.465775803, 0.468897484, 0.472765073, 0.476632662, 0.48050025, 0.484367839, 0.48831916, 0.492270481, 0.496221802, 0.500173123, 0.503378411, 0.506583699, 0.509788987, 0.512994275, 0.516694845, 0.520395415, 0.524095986, 0.527796556, 0.531602998, 0.535409439, 0.539215881, 0.543022322, 0.546079068, 0.549135814, 0.55219256, 0.555249306, 0.559056331, 0.562863355, 0.56667038, 0.570477405, 0.574345034, 0.578212663, 0.582080292, 0.585947921, 0.589069613, 0.592191305, 0.595312997, 0.598434689, 0.60230254, 0.606170391, 0.610038243, 0.613906094, 0.617628434, 0.621350774, 0.625073114, 0.628795454, 0.632021174, 0.635246894, 0.638472615, 0.641698335, 0.645420466, 0.649142598, 0.652864729, 0.65658686, 0.660287157, 0.663987454, 0.667687751, 0.671388049, 0.67459355, 0.67779905, 0.681004551, 0.684210052, 0.688161439, 0.692112826, 0.696064213, 0.7000156, 0.703966976, 0.707918351, 0.711869726, 0.715821101, 0.719026579, 0.722232057, 0.725437535, 0.728643013, 0.732343344, 0.736043676, 0.739744007, 0.743444338, 0.747166448, 0.750888558, 0.754610667, 0.758332777, 0.761558491, 0.764784206, 0.76800992, 0.771235635, 0.774958003, 0.77868037, 0.782402738, 0.786125106, 0.789992926, 0.793860747, 0.797728568, 0.801596388, 0.804718085, 0.807839781, 0.810961478, 0.814083175, 0.81795083, 0.821818485, 0.82568614, 0.829553796, 0.833276337, 0.836998878, 0.84072142, 0.844443961, 0.847669617, 0.850895272, 0.854120928, 0.857346583, 0.861068582, 0.86479058, 0.868512578, 0.872234577, 0.875935111, 0.879635646, 0.883336181, 0.887036715, 0.890242035, 0.893447355, 0.896652674, 0.899857994, 0.90380932, 0.905784983, 0.907760646, 0.909736309, 0.911711972, 0.913687635, 0.915663298, 0.917785895, 0.918847194, 0.919908493, 0.920969792, 0.922031091, 0.92256174, 0.923092389, 0.923623039, 0.924153688, 0.924153688, 0.924153688, 0.924153688, 0.924153688], degree=4))
            add(Edge.make_bspline(
                [(33.1529127, 3.177331049), (31.922295464, 1.706002382), (32.25, 1e-09)],
                knots=[0, 0, 0, 1, 1, 1], degree=2))
        make_face()
    extrude(amount=BOSS_EXTRUDE1_DEPTH)

    # Sketch2 → Cut-Extrude3 (cut, through all)
    with BuildSketch(Plane.XY.offset(7)):
        Circle(SKETCH2_R)
        with Locations((0.054422972, 18.999922056)):
            Circle(SKETCH2_R_2)
        with Locations((16.481626656, 9.452829352)):
            Circle(SKETCH2_R_2)
        with Locations((-16.427203685, 9.547092704)):
            Circle(SKETCH2_R_2)
        with Locations(Location((16.481626656, -9.452829352, 0), (0, 0, 180))):
            Circle(SKETCH2_R_3)
        with Locations(Location((0.054422972, -18.999922056, 0), (0, 0, 180))):
            Circle(SKETCH2_R_4)
        with Locations(Location((-16.427203685, -9.547092704, 0), (0, 0, 180))):
            Circle(SKETCH2_R_5)
    extrude(amount=-CUT_EXTRUDE3_DEPTH, mode=Mode.SUBTRACT)


solid = part.part
